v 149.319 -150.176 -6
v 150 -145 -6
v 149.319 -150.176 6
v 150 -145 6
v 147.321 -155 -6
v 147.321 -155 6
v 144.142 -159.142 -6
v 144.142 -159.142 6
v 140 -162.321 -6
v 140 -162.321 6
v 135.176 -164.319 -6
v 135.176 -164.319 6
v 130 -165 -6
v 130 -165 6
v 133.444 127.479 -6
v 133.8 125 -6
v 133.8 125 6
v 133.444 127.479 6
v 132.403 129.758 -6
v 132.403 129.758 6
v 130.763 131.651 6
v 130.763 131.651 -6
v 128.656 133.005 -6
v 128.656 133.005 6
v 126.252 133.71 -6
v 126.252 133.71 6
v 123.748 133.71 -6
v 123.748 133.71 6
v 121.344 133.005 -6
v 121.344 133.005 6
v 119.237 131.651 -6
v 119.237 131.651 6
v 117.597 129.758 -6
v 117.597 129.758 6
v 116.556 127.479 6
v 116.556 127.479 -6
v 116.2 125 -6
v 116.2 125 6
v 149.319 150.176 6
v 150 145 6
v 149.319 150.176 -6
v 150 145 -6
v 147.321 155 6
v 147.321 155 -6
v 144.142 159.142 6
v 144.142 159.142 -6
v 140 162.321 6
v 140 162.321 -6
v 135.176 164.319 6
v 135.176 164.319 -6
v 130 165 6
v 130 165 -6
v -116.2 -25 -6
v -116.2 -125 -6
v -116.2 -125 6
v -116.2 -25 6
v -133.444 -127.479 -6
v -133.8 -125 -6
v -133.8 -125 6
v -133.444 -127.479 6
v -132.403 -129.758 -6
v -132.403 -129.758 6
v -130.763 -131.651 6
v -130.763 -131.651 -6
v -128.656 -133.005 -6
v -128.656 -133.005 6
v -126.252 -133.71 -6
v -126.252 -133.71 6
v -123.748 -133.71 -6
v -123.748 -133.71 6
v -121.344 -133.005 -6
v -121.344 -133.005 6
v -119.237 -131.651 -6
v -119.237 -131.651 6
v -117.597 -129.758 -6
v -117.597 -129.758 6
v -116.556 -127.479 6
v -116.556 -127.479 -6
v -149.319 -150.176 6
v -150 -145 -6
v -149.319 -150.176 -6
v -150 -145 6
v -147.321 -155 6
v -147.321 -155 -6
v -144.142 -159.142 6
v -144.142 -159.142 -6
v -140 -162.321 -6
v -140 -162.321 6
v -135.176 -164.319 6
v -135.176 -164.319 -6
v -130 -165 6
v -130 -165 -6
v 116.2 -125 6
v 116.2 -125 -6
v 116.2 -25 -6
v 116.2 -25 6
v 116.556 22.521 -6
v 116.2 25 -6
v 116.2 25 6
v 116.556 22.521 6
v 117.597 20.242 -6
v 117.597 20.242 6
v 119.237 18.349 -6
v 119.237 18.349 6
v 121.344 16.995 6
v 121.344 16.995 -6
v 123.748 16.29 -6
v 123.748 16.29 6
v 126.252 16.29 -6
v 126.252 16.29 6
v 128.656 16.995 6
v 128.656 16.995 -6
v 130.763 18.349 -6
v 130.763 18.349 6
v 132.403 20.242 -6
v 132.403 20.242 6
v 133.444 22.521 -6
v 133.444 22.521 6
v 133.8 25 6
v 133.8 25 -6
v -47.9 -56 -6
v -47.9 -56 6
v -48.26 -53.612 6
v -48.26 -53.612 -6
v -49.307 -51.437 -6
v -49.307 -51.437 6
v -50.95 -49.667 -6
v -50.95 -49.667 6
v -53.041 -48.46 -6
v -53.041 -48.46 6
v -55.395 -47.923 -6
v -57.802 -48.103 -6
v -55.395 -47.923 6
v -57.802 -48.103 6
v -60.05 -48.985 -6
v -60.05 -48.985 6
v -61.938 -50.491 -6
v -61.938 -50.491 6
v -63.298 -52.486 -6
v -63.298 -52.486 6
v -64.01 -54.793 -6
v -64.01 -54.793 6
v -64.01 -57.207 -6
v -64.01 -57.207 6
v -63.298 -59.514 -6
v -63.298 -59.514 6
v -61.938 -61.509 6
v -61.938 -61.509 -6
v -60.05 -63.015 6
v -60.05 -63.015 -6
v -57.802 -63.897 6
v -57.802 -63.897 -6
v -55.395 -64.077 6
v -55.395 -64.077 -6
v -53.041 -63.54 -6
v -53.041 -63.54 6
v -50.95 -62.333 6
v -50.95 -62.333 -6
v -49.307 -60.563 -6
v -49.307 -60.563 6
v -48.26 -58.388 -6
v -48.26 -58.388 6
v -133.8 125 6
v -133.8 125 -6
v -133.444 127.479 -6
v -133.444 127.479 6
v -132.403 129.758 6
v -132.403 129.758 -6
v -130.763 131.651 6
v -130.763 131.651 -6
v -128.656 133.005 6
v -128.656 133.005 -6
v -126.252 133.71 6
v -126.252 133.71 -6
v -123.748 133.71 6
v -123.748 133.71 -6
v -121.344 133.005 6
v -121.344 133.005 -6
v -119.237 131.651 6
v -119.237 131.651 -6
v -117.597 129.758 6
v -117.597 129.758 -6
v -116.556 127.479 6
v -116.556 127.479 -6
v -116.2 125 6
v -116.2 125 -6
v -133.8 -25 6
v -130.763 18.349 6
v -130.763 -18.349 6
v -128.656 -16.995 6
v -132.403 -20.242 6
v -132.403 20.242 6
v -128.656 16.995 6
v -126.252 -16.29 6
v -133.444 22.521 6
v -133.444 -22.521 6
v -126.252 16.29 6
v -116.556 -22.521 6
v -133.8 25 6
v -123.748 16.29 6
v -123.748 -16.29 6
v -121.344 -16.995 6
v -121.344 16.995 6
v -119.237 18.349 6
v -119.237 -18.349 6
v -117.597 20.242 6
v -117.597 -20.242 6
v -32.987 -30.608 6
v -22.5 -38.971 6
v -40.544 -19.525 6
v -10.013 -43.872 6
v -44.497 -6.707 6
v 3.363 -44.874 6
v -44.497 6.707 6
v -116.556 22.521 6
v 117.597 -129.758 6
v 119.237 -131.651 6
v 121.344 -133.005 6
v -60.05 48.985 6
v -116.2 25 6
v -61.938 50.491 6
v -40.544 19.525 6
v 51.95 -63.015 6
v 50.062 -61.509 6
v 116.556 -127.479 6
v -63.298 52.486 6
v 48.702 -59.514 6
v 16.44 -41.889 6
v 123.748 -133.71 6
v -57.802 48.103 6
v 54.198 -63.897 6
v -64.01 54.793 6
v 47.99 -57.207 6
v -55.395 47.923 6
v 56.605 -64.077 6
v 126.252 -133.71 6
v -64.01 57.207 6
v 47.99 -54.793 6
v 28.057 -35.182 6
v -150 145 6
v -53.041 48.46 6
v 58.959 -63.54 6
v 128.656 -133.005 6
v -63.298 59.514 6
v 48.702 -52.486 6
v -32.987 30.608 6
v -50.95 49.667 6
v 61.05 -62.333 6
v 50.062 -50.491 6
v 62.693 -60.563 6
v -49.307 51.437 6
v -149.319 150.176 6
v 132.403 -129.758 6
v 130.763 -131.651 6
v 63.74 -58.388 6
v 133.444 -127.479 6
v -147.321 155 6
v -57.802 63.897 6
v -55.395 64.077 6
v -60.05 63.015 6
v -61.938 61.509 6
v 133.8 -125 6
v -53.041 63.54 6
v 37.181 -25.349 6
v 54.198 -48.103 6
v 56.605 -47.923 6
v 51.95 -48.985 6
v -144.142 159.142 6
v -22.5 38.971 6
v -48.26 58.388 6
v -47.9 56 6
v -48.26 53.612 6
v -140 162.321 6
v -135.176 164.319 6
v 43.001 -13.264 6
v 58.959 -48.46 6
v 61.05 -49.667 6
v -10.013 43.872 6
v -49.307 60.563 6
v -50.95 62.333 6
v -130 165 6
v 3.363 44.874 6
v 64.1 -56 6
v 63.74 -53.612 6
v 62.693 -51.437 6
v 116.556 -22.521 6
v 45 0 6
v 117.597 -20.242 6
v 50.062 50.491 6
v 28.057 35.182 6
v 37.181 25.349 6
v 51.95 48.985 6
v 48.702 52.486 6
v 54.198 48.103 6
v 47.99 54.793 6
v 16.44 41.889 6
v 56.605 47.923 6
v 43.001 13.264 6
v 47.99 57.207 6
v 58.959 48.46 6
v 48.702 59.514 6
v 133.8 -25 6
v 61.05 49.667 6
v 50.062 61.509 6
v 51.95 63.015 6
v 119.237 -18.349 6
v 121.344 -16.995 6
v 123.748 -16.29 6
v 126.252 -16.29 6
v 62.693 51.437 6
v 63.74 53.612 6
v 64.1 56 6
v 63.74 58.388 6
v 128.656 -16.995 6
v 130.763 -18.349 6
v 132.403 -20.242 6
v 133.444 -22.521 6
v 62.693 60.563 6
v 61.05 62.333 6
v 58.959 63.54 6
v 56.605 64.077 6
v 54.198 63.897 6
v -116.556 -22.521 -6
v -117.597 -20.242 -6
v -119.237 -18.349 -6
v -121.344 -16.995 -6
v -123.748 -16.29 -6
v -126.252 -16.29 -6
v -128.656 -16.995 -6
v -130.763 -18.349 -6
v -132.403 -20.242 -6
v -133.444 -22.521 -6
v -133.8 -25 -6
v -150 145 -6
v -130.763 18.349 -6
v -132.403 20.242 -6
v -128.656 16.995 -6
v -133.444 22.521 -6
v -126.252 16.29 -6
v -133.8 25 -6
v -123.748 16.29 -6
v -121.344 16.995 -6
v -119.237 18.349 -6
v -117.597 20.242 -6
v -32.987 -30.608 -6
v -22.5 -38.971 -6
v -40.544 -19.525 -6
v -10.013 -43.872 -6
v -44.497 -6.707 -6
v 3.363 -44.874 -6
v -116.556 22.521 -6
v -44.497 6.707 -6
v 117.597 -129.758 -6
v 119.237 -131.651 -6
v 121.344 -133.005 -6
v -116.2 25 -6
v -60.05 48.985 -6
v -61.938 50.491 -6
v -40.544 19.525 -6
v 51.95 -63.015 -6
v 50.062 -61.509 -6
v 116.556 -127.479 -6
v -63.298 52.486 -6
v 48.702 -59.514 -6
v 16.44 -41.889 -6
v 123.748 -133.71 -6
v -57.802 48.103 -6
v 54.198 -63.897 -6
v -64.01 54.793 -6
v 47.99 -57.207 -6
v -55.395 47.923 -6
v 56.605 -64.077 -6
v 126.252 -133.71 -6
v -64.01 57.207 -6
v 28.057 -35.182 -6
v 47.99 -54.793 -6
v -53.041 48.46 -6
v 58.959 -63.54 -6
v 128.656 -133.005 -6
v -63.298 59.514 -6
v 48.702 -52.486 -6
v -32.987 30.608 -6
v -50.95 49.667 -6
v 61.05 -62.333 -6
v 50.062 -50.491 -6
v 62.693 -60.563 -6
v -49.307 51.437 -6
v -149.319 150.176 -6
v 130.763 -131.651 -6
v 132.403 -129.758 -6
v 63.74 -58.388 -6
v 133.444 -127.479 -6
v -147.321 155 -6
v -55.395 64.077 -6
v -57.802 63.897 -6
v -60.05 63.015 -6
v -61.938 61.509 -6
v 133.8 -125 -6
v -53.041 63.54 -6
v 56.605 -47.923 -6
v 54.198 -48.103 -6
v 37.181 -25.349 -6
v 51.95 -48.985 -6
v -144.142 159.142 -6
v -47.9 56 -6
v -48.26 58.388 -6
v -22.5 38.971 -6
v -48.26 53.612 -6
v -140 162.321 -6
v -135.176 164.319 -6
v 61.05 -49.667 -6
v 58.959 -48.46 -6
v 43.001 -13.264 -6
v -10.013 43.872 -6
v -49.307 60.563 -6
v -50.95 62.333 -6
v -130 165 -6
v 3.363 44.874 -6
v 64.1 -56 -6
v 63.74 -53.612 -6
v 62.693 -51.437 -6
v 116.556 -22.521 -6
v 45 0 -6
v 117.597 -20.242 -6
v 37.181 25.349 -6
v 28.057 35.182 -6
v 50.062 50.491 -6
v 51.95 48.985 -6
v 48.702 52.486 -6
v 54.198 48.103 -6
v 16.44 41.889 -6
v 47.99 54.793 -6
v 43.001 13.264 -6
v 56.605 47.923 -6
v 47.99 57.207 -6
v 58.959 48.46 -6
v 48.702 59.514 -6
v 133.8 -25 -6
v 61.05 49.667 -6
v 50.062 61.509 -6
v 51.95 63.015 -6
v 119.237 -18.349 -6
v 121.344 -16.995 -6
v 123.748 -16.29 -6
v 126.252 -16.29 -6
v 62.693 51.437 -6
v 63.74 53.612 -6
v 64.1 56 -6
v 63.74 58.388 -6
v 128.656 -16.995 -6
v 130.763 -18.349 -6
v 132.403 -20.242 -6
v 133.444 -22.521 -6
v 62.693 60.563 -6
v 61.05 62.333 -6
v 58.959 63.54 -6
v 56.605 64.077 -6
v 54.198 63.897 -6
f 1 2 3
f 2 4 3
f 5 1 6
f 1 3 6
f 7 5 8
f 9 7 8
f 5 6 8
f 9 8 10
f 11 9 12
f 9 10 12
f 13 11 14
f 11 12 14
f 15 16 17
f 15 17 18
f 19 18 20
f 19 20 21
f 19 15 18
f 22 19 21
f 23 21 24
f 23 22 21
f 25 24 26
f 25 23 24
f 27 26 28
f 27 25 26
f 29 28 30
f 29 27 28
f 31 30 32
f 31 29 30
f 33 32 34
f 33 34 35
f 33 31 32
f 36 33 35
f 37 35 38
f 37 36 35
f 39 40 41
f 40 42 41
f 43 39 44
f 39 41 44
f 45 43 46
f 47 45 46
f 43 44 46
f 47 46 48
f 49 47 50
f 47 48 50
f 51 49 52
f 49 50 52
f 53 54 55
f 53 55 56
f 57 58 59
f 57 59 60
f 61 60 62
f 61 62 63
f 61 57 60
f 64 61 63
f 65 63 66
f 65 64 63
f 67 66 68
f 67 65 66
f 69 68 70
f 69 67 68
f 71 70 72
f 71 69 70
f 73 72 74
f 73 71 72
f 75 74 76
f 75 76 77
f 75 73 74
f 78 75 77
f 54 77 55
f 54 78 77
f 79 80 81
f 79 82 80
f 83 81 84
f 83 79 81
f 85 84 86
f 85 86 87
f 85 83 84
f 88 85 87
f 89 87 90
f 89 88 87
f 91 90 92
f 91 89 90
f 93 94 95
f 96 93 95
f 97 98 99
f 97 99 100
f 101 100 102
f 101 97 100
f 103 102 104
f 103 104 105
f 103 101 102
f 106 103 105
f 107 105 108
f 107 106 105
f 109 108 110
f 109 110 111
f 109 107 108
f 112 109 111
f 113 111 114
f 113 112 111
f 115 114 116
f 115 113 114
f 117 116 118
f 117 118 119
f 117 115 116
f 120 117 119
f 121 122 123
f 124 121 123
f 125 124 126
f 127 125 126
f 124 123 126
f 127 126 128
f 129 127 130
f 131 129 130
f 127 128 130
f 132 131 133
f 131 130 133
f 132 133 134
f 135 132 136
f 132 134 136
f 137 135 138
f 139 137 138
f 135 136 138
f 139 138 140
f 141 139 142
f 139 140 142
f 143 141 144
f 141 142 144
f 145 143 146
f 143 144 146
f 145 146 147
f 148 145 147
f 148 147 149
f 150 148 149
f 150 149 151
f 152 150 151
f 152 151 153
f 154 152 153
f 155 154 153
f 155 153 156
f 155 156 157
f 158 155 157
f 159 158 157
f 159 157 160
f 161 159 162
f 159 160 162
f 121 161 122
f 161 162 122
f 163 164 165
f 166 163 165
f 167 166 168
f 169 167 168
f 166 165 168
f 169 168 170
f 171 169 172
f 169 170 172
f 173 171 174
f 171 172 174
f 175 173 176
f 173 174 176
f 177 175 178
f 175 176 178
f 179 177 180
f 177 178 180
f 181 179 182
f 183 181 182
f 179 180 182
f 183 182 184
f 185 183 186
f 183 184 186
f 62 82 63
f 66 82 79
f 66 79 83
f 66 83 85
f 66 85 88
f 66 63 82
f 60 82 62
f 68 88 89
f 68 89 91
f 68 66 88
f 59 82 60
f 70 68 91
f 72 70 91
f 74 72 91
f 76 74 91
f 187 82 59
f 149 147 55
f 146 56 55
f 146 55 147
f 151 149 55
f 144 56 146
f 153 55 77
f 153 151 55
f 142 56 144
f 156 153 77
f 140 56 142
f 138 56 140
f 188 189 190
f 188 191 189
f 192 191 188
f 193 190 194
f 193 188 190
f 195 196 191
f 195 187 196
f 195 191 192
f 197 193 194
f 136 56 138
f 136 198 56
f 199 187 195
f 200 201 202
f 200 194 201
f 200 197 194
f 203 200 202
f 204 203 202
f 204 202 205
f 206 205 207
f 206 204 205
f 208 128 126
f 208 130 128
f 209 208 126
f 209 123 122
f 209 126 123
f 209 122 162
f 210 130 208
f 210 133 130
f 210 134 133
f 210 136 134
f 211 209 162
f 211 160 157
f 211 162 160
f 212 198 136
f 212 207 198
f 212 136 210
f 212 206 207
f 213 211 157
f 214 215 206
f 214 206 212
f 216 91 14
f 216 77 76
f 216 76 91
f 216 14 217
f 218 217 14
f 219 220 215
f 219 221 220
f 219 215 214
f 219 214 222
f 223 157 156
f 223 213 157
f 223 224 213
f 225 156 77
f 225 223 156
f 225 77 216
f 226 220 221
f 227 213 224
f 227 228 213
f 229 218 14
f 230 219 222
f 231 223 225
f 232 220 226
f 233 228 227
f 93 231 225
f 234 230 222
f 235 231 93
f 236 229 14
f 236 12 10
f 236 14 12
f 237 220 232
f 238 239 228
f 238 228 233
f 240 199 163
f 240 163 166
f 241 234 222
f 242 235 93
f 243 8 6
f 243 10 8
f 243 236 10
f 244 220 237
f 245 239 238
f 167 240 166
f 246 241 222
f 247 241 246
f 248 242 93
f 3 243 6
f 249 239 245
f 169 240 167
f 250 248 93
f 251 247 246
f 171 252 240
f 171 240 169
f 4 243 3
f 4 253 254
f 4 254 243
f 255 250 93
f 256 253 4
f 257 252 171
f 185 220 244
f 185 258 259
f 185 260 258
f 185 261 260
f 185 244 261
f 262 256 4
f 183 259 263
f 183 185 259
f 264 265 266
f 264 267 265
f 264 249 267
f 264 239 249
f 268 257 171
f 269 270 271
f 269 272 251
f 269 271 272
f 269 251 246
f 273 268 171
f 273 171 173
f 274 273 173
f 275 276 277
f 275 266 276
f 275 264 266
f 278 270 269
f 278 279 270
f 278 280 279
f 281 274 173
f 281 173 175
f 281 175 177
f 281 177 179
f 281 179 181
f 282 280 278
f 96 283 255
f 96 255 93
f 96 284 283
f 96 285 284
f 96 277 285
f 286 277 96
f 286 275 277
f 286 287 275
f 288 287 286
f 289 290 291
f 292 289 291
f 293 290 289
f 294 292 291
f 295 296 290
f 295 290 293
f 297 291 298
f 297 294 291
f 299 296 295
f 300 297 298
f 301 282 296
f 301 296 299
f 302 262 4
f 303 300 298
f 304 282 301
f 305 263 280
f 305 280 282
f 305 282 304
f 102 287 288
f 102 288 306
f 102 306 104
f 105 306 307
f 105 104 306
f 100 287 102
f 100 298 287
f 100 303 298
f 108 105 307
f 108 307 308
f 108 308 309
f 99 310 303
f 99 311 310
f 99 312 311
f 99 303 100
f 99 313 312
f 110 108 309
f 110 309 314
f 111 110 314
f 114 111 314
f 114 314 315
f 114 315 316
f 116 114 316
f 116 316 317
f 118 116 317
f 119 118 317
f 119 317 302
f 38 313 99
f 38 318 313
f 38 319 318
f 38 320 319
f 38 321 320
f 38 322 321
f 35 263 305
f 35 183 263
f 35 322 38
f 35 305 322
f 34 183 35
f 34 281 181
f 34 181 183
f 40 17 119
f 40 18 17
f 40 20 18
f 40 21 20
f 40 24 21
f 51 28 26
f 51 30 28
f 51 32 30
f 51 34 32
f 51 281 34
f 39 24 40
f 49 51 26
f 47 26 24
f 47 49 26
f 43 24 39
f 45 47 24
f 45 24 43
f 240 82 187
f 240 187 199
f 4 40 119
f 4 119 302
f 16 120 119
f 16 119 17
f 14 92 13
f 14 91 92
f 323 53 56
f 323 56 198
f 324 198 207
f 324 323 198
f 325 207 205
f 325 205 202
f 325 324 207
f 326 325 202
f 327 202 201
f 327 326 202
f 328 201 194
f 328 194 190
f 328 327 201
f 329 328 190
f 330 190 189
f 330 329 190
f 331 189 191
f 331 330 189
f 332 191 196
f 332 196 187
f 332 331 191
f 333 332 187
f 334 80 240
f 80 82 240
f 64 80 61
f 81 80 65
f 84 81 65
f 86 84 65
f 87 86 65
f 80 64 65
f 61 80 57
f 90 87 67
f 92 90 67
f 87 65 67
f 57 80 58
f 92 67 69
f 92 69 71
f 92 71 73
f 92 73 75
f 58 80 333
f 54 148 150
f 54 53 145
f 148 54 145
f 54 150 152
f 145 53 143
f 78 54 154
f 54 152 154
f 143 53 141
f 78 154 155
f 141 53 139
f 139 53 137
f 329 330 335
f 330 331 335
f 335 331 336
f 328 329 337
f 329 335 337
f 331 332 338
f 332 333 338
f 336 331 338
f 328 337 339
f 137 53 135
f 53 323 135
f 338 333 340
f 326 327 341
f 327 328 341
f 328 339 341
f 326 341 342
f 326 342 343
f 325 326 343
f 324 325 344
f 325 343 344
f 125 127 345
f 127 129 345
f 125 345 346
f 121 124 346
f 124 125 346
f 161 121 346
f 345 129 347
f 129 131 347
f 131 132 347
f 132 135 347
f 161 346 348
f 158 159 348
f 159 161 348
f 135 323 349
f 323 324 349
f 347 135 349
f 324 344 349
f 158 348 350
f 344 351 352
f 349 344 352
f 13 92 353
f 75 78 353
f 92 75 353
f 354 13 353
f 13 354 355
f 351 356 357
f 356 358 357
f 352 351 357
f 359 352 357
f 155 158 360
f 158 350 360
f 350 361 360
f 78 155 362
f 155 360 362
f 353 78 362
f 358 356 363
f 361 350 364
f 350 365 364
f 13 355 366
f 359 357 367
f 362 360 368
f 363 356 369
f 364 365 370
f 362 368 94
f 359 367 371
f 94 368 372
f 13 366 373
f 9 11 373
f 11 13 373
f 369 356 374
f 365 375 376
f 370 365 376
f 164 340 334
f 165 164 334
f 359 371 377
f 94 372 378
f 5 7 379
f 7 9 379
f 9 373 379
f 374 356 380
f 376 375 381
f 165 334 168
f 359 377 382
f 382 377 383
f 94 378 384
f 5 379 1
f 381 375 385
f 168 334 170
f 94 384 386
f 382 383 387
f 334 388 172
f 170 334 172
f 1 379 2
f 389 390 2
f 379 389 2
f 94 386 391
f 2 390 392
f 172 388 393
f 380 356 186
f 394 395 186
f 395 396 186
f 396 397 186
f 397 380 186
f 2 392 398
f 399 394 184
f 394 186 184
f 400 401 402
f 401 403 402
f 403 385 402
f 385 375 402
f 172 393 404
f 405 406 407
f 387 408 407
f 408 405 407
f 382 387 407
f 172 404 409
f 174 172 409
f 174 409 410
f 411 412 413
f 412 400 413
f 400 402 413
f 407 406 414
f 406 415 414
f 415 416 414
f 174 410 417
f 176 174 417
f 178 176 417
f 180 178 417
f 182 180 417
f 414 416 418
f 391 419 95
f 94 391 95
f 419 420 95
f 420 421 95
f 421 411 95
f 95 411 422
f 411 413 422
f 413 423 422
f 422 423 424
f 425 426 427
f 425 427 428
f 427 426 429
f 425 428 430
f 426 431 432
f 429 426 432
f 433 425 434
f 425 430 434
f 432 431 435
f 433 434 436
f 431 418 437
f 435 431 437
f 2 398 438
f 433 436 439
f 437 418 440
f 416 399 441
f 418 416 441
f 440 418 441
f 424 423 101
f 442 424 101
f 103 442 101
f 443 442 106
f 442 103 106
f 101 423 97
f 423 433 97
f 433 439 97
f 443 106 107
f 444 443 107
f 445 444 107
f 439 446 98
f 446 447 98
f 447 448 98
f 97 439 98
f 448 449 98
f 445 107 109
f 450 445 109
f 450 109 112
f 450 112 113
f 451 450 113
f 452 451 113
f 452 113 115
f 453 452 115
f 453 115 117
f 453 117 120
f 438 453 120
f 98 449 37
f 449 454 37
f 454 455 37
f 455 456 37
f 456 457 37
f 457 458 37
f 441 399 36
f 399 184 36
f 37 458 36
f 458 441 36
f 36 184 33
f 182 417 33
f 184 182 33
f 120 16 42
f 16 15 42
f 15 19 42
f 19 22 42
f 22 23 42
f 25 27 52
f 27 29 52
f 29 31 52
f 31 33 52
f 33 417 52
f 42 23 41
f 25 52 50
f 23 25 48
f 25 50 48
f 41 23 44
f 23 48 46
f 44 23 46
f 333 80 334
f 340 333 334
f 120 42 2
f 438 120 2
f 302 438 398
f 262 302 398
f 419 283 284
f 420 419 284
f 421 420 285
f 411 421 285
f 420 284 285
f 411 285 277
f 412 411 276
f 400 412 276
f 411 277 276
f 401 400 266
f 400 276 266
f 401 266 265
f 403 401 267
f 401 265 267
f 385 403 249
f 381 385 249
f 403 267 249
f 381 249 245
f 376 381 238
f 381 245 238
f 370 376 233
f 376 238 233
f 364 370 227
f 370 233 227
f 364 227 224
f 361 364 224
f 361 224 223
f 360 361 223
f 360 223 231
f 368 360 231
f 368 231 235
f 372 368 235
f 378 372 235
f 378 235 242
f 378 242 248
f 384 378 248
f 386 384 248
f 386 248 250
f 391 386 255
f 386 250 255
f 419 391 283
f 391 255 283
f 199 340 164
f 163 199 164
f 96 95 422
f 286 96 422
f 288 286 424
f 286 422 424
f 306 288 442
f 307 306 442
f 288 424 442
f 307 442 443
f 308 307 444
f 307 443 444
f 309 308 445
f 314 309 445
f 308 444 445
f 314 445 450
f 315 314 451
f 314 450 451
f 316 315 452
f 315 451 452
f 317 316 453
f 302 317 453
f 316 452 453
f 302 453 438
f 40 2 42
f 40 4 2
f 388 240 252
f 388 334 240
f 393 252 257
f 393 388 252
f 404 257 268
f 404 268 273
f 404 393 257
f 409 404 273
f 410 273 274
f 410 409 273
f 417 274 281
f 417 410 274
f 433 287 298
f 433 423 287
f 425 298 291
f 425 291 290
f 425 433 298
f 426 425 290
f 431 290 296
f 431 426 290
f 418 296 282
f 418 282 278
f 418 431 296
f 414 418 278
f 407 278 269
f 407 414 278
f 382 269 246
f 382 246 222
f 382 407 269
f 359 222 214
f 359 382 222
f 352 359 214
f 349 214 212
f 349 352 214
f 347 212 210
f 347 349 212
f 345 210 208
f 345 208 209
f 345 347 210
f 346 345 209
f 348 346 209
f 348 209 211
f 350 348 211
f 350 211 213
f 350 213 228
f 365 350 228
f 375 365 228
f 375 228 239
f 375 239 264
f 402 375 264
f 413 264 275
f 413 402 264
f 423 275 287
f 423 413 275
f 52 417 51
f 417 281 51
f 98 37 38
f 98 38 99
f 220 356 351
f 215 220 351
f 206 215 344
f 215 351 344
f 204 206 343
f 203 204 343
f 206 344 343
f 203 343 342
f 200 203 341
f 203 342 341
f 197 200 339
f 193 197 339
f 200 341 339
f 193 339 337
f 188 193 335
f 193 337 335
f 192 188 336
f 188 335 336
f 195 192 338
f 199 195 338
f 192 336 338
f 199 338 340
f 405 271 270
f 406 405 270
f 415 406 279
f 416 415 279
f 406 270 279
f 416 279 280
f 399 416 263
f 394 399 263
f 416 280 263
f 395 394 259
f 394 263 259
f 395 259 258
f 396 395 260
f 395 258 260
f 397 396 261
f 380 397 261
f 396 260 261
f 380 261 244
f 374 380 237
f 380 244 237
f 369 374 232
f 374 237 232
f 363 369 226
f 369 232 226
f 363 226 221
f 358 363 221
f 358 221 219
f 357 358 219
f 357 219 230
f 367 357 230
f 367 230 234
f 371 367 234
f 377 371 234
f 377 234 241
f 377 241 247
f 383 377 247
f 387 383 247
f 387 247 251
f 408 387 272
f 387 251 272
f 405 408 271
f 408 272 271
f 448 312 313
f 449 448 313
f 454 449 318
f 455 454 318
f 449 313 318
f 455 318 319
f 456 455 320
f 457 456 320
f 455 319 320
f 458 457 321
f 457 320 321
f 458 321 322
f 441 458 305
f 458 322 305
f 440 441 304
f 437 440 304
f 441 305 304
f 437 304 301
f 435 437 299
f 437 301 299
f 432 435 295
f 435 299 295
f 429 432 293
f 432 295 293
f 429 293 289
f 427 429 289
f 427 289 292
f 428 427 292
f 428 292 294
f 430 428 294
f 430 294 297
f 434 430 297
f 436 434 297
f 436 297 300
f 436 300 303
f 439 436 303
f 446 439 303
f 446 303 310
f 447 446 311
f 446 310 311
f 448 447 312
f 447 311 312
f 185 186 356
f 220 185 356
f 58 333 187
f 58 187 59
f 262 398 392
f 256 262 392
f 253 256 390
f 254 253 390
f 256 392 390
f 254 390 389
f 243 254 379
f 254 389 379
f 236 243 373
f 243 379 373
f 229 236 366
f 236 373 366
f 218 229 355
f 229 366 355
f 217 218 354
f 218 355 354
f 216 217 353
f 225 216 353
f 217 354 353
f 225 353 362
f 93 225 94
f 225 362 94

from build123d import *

# Parameters (mm, degrees)
SKETCH_1_W          = 300
SKETCH_1_H          = 330
SKETCH_1_R          = 45
EXTRUDE_1_DEPTH     = 6
FILLET_1_R          = 20
SKETCH_3_R          = 8.1
CUT_EXTRUDE_2_DEPTH = 12
CUT_EXTRUDE_3_DEPTH = 12


with BuildPart() as part:
    # Эскиз1 → Бобышка-Вытянуть1 (new, symmetric)
    with BuildSketch(Plane.XY):
        Rectangle(SKETCH_1_W, SKETCH_1_H)
        Circle(SKETCH_1_R, mode=Mode.SUBTRACT)
    extrude(amount=EXTRUDE_1_DEPTH, both=True)

    # Скругление1
    fillet_1_edges = [part.edges().sort_by_distance(p)[0] for p in [
        (150, -165, 0),
        (-150, -165, 0),
        (-150, 165, 0),
        (150, 165, 0),
    ]]
    fillet(fillet_1_edges, radius=FILLET_1_R)

    # Эскиз3 → Вырез-Вытянуть2 (cut)
    with BuildSketch(Plane.XY.offset(6)):
        with Locations((-56, 56)):
            Circle(SKETCH_3_R)
        with Locations((56, 56)):
            Circle(SKETCH_3_R)
        with Locations((56, -56)):
            Circle(SKETCH_3_R)
        with Locations((-56, -56)):
            Circle(SKETCH_3_R)
    extrude(amount=-CUT_EXTRUDE_2_DEPTH, mode=Mode.SUBTRACT)

    # Эскиз4 → Вырез-Вытянуть3 (cut)
    with BuildSketch(Plane(origin=(0, 0, -6), x_dir=(-1, 0, 0), z_dir=(0, 0, -1))):
        with BuildLine():
            Line((-133.8, 25), (-133.8, 125))
            ThreePointArc((-133.8, 125), (-125, 133.8), (-116.2, 125))
            Line((-116.2, 125), (-116.2, 25))
            ThreePointArc((-116.2, 25), (-125, 16.2), (-133.8, 25))
        make_face()
        with BuildLine():
            Line((-133.8, -25), (-133.8, -125))
            ThreePointArc((-133.8, -125), (-125, -133.8), (-116.2, -125))
            Line((-116.2, -125), (-116.2, -25))
            ThreePointArc((-116.2, -25), (-125, -16.2), (-133.8, -25))
        make_face()
        with BuildLine():
            Line((133.8, -25), (133.8, -125))
            ThreePointArc((133.8, -125), (125, -133.8), (116.2, -125))
            Line((116.2, -125), (116.2, -25))
            ThreePointArc((116.2, -25), (125, -16.2), (133.8, -25))
        make_face()
        with BuildLine():
            Line((133.8, 25), (133.8, 125))
            ThreePointArc((133.8, 125), (125, 133.8), (116.2, 125))
            Line((116.2, 125), (116.2, 25))
            ThreePointArc((116.2, 25), (125, 16.2), (133.8, 25))
        make_face()
    extrude(amount=-CUT_EXTRUDE_3_DEPTH, mode=Mode.SUBTRACT)


solid = part.part
